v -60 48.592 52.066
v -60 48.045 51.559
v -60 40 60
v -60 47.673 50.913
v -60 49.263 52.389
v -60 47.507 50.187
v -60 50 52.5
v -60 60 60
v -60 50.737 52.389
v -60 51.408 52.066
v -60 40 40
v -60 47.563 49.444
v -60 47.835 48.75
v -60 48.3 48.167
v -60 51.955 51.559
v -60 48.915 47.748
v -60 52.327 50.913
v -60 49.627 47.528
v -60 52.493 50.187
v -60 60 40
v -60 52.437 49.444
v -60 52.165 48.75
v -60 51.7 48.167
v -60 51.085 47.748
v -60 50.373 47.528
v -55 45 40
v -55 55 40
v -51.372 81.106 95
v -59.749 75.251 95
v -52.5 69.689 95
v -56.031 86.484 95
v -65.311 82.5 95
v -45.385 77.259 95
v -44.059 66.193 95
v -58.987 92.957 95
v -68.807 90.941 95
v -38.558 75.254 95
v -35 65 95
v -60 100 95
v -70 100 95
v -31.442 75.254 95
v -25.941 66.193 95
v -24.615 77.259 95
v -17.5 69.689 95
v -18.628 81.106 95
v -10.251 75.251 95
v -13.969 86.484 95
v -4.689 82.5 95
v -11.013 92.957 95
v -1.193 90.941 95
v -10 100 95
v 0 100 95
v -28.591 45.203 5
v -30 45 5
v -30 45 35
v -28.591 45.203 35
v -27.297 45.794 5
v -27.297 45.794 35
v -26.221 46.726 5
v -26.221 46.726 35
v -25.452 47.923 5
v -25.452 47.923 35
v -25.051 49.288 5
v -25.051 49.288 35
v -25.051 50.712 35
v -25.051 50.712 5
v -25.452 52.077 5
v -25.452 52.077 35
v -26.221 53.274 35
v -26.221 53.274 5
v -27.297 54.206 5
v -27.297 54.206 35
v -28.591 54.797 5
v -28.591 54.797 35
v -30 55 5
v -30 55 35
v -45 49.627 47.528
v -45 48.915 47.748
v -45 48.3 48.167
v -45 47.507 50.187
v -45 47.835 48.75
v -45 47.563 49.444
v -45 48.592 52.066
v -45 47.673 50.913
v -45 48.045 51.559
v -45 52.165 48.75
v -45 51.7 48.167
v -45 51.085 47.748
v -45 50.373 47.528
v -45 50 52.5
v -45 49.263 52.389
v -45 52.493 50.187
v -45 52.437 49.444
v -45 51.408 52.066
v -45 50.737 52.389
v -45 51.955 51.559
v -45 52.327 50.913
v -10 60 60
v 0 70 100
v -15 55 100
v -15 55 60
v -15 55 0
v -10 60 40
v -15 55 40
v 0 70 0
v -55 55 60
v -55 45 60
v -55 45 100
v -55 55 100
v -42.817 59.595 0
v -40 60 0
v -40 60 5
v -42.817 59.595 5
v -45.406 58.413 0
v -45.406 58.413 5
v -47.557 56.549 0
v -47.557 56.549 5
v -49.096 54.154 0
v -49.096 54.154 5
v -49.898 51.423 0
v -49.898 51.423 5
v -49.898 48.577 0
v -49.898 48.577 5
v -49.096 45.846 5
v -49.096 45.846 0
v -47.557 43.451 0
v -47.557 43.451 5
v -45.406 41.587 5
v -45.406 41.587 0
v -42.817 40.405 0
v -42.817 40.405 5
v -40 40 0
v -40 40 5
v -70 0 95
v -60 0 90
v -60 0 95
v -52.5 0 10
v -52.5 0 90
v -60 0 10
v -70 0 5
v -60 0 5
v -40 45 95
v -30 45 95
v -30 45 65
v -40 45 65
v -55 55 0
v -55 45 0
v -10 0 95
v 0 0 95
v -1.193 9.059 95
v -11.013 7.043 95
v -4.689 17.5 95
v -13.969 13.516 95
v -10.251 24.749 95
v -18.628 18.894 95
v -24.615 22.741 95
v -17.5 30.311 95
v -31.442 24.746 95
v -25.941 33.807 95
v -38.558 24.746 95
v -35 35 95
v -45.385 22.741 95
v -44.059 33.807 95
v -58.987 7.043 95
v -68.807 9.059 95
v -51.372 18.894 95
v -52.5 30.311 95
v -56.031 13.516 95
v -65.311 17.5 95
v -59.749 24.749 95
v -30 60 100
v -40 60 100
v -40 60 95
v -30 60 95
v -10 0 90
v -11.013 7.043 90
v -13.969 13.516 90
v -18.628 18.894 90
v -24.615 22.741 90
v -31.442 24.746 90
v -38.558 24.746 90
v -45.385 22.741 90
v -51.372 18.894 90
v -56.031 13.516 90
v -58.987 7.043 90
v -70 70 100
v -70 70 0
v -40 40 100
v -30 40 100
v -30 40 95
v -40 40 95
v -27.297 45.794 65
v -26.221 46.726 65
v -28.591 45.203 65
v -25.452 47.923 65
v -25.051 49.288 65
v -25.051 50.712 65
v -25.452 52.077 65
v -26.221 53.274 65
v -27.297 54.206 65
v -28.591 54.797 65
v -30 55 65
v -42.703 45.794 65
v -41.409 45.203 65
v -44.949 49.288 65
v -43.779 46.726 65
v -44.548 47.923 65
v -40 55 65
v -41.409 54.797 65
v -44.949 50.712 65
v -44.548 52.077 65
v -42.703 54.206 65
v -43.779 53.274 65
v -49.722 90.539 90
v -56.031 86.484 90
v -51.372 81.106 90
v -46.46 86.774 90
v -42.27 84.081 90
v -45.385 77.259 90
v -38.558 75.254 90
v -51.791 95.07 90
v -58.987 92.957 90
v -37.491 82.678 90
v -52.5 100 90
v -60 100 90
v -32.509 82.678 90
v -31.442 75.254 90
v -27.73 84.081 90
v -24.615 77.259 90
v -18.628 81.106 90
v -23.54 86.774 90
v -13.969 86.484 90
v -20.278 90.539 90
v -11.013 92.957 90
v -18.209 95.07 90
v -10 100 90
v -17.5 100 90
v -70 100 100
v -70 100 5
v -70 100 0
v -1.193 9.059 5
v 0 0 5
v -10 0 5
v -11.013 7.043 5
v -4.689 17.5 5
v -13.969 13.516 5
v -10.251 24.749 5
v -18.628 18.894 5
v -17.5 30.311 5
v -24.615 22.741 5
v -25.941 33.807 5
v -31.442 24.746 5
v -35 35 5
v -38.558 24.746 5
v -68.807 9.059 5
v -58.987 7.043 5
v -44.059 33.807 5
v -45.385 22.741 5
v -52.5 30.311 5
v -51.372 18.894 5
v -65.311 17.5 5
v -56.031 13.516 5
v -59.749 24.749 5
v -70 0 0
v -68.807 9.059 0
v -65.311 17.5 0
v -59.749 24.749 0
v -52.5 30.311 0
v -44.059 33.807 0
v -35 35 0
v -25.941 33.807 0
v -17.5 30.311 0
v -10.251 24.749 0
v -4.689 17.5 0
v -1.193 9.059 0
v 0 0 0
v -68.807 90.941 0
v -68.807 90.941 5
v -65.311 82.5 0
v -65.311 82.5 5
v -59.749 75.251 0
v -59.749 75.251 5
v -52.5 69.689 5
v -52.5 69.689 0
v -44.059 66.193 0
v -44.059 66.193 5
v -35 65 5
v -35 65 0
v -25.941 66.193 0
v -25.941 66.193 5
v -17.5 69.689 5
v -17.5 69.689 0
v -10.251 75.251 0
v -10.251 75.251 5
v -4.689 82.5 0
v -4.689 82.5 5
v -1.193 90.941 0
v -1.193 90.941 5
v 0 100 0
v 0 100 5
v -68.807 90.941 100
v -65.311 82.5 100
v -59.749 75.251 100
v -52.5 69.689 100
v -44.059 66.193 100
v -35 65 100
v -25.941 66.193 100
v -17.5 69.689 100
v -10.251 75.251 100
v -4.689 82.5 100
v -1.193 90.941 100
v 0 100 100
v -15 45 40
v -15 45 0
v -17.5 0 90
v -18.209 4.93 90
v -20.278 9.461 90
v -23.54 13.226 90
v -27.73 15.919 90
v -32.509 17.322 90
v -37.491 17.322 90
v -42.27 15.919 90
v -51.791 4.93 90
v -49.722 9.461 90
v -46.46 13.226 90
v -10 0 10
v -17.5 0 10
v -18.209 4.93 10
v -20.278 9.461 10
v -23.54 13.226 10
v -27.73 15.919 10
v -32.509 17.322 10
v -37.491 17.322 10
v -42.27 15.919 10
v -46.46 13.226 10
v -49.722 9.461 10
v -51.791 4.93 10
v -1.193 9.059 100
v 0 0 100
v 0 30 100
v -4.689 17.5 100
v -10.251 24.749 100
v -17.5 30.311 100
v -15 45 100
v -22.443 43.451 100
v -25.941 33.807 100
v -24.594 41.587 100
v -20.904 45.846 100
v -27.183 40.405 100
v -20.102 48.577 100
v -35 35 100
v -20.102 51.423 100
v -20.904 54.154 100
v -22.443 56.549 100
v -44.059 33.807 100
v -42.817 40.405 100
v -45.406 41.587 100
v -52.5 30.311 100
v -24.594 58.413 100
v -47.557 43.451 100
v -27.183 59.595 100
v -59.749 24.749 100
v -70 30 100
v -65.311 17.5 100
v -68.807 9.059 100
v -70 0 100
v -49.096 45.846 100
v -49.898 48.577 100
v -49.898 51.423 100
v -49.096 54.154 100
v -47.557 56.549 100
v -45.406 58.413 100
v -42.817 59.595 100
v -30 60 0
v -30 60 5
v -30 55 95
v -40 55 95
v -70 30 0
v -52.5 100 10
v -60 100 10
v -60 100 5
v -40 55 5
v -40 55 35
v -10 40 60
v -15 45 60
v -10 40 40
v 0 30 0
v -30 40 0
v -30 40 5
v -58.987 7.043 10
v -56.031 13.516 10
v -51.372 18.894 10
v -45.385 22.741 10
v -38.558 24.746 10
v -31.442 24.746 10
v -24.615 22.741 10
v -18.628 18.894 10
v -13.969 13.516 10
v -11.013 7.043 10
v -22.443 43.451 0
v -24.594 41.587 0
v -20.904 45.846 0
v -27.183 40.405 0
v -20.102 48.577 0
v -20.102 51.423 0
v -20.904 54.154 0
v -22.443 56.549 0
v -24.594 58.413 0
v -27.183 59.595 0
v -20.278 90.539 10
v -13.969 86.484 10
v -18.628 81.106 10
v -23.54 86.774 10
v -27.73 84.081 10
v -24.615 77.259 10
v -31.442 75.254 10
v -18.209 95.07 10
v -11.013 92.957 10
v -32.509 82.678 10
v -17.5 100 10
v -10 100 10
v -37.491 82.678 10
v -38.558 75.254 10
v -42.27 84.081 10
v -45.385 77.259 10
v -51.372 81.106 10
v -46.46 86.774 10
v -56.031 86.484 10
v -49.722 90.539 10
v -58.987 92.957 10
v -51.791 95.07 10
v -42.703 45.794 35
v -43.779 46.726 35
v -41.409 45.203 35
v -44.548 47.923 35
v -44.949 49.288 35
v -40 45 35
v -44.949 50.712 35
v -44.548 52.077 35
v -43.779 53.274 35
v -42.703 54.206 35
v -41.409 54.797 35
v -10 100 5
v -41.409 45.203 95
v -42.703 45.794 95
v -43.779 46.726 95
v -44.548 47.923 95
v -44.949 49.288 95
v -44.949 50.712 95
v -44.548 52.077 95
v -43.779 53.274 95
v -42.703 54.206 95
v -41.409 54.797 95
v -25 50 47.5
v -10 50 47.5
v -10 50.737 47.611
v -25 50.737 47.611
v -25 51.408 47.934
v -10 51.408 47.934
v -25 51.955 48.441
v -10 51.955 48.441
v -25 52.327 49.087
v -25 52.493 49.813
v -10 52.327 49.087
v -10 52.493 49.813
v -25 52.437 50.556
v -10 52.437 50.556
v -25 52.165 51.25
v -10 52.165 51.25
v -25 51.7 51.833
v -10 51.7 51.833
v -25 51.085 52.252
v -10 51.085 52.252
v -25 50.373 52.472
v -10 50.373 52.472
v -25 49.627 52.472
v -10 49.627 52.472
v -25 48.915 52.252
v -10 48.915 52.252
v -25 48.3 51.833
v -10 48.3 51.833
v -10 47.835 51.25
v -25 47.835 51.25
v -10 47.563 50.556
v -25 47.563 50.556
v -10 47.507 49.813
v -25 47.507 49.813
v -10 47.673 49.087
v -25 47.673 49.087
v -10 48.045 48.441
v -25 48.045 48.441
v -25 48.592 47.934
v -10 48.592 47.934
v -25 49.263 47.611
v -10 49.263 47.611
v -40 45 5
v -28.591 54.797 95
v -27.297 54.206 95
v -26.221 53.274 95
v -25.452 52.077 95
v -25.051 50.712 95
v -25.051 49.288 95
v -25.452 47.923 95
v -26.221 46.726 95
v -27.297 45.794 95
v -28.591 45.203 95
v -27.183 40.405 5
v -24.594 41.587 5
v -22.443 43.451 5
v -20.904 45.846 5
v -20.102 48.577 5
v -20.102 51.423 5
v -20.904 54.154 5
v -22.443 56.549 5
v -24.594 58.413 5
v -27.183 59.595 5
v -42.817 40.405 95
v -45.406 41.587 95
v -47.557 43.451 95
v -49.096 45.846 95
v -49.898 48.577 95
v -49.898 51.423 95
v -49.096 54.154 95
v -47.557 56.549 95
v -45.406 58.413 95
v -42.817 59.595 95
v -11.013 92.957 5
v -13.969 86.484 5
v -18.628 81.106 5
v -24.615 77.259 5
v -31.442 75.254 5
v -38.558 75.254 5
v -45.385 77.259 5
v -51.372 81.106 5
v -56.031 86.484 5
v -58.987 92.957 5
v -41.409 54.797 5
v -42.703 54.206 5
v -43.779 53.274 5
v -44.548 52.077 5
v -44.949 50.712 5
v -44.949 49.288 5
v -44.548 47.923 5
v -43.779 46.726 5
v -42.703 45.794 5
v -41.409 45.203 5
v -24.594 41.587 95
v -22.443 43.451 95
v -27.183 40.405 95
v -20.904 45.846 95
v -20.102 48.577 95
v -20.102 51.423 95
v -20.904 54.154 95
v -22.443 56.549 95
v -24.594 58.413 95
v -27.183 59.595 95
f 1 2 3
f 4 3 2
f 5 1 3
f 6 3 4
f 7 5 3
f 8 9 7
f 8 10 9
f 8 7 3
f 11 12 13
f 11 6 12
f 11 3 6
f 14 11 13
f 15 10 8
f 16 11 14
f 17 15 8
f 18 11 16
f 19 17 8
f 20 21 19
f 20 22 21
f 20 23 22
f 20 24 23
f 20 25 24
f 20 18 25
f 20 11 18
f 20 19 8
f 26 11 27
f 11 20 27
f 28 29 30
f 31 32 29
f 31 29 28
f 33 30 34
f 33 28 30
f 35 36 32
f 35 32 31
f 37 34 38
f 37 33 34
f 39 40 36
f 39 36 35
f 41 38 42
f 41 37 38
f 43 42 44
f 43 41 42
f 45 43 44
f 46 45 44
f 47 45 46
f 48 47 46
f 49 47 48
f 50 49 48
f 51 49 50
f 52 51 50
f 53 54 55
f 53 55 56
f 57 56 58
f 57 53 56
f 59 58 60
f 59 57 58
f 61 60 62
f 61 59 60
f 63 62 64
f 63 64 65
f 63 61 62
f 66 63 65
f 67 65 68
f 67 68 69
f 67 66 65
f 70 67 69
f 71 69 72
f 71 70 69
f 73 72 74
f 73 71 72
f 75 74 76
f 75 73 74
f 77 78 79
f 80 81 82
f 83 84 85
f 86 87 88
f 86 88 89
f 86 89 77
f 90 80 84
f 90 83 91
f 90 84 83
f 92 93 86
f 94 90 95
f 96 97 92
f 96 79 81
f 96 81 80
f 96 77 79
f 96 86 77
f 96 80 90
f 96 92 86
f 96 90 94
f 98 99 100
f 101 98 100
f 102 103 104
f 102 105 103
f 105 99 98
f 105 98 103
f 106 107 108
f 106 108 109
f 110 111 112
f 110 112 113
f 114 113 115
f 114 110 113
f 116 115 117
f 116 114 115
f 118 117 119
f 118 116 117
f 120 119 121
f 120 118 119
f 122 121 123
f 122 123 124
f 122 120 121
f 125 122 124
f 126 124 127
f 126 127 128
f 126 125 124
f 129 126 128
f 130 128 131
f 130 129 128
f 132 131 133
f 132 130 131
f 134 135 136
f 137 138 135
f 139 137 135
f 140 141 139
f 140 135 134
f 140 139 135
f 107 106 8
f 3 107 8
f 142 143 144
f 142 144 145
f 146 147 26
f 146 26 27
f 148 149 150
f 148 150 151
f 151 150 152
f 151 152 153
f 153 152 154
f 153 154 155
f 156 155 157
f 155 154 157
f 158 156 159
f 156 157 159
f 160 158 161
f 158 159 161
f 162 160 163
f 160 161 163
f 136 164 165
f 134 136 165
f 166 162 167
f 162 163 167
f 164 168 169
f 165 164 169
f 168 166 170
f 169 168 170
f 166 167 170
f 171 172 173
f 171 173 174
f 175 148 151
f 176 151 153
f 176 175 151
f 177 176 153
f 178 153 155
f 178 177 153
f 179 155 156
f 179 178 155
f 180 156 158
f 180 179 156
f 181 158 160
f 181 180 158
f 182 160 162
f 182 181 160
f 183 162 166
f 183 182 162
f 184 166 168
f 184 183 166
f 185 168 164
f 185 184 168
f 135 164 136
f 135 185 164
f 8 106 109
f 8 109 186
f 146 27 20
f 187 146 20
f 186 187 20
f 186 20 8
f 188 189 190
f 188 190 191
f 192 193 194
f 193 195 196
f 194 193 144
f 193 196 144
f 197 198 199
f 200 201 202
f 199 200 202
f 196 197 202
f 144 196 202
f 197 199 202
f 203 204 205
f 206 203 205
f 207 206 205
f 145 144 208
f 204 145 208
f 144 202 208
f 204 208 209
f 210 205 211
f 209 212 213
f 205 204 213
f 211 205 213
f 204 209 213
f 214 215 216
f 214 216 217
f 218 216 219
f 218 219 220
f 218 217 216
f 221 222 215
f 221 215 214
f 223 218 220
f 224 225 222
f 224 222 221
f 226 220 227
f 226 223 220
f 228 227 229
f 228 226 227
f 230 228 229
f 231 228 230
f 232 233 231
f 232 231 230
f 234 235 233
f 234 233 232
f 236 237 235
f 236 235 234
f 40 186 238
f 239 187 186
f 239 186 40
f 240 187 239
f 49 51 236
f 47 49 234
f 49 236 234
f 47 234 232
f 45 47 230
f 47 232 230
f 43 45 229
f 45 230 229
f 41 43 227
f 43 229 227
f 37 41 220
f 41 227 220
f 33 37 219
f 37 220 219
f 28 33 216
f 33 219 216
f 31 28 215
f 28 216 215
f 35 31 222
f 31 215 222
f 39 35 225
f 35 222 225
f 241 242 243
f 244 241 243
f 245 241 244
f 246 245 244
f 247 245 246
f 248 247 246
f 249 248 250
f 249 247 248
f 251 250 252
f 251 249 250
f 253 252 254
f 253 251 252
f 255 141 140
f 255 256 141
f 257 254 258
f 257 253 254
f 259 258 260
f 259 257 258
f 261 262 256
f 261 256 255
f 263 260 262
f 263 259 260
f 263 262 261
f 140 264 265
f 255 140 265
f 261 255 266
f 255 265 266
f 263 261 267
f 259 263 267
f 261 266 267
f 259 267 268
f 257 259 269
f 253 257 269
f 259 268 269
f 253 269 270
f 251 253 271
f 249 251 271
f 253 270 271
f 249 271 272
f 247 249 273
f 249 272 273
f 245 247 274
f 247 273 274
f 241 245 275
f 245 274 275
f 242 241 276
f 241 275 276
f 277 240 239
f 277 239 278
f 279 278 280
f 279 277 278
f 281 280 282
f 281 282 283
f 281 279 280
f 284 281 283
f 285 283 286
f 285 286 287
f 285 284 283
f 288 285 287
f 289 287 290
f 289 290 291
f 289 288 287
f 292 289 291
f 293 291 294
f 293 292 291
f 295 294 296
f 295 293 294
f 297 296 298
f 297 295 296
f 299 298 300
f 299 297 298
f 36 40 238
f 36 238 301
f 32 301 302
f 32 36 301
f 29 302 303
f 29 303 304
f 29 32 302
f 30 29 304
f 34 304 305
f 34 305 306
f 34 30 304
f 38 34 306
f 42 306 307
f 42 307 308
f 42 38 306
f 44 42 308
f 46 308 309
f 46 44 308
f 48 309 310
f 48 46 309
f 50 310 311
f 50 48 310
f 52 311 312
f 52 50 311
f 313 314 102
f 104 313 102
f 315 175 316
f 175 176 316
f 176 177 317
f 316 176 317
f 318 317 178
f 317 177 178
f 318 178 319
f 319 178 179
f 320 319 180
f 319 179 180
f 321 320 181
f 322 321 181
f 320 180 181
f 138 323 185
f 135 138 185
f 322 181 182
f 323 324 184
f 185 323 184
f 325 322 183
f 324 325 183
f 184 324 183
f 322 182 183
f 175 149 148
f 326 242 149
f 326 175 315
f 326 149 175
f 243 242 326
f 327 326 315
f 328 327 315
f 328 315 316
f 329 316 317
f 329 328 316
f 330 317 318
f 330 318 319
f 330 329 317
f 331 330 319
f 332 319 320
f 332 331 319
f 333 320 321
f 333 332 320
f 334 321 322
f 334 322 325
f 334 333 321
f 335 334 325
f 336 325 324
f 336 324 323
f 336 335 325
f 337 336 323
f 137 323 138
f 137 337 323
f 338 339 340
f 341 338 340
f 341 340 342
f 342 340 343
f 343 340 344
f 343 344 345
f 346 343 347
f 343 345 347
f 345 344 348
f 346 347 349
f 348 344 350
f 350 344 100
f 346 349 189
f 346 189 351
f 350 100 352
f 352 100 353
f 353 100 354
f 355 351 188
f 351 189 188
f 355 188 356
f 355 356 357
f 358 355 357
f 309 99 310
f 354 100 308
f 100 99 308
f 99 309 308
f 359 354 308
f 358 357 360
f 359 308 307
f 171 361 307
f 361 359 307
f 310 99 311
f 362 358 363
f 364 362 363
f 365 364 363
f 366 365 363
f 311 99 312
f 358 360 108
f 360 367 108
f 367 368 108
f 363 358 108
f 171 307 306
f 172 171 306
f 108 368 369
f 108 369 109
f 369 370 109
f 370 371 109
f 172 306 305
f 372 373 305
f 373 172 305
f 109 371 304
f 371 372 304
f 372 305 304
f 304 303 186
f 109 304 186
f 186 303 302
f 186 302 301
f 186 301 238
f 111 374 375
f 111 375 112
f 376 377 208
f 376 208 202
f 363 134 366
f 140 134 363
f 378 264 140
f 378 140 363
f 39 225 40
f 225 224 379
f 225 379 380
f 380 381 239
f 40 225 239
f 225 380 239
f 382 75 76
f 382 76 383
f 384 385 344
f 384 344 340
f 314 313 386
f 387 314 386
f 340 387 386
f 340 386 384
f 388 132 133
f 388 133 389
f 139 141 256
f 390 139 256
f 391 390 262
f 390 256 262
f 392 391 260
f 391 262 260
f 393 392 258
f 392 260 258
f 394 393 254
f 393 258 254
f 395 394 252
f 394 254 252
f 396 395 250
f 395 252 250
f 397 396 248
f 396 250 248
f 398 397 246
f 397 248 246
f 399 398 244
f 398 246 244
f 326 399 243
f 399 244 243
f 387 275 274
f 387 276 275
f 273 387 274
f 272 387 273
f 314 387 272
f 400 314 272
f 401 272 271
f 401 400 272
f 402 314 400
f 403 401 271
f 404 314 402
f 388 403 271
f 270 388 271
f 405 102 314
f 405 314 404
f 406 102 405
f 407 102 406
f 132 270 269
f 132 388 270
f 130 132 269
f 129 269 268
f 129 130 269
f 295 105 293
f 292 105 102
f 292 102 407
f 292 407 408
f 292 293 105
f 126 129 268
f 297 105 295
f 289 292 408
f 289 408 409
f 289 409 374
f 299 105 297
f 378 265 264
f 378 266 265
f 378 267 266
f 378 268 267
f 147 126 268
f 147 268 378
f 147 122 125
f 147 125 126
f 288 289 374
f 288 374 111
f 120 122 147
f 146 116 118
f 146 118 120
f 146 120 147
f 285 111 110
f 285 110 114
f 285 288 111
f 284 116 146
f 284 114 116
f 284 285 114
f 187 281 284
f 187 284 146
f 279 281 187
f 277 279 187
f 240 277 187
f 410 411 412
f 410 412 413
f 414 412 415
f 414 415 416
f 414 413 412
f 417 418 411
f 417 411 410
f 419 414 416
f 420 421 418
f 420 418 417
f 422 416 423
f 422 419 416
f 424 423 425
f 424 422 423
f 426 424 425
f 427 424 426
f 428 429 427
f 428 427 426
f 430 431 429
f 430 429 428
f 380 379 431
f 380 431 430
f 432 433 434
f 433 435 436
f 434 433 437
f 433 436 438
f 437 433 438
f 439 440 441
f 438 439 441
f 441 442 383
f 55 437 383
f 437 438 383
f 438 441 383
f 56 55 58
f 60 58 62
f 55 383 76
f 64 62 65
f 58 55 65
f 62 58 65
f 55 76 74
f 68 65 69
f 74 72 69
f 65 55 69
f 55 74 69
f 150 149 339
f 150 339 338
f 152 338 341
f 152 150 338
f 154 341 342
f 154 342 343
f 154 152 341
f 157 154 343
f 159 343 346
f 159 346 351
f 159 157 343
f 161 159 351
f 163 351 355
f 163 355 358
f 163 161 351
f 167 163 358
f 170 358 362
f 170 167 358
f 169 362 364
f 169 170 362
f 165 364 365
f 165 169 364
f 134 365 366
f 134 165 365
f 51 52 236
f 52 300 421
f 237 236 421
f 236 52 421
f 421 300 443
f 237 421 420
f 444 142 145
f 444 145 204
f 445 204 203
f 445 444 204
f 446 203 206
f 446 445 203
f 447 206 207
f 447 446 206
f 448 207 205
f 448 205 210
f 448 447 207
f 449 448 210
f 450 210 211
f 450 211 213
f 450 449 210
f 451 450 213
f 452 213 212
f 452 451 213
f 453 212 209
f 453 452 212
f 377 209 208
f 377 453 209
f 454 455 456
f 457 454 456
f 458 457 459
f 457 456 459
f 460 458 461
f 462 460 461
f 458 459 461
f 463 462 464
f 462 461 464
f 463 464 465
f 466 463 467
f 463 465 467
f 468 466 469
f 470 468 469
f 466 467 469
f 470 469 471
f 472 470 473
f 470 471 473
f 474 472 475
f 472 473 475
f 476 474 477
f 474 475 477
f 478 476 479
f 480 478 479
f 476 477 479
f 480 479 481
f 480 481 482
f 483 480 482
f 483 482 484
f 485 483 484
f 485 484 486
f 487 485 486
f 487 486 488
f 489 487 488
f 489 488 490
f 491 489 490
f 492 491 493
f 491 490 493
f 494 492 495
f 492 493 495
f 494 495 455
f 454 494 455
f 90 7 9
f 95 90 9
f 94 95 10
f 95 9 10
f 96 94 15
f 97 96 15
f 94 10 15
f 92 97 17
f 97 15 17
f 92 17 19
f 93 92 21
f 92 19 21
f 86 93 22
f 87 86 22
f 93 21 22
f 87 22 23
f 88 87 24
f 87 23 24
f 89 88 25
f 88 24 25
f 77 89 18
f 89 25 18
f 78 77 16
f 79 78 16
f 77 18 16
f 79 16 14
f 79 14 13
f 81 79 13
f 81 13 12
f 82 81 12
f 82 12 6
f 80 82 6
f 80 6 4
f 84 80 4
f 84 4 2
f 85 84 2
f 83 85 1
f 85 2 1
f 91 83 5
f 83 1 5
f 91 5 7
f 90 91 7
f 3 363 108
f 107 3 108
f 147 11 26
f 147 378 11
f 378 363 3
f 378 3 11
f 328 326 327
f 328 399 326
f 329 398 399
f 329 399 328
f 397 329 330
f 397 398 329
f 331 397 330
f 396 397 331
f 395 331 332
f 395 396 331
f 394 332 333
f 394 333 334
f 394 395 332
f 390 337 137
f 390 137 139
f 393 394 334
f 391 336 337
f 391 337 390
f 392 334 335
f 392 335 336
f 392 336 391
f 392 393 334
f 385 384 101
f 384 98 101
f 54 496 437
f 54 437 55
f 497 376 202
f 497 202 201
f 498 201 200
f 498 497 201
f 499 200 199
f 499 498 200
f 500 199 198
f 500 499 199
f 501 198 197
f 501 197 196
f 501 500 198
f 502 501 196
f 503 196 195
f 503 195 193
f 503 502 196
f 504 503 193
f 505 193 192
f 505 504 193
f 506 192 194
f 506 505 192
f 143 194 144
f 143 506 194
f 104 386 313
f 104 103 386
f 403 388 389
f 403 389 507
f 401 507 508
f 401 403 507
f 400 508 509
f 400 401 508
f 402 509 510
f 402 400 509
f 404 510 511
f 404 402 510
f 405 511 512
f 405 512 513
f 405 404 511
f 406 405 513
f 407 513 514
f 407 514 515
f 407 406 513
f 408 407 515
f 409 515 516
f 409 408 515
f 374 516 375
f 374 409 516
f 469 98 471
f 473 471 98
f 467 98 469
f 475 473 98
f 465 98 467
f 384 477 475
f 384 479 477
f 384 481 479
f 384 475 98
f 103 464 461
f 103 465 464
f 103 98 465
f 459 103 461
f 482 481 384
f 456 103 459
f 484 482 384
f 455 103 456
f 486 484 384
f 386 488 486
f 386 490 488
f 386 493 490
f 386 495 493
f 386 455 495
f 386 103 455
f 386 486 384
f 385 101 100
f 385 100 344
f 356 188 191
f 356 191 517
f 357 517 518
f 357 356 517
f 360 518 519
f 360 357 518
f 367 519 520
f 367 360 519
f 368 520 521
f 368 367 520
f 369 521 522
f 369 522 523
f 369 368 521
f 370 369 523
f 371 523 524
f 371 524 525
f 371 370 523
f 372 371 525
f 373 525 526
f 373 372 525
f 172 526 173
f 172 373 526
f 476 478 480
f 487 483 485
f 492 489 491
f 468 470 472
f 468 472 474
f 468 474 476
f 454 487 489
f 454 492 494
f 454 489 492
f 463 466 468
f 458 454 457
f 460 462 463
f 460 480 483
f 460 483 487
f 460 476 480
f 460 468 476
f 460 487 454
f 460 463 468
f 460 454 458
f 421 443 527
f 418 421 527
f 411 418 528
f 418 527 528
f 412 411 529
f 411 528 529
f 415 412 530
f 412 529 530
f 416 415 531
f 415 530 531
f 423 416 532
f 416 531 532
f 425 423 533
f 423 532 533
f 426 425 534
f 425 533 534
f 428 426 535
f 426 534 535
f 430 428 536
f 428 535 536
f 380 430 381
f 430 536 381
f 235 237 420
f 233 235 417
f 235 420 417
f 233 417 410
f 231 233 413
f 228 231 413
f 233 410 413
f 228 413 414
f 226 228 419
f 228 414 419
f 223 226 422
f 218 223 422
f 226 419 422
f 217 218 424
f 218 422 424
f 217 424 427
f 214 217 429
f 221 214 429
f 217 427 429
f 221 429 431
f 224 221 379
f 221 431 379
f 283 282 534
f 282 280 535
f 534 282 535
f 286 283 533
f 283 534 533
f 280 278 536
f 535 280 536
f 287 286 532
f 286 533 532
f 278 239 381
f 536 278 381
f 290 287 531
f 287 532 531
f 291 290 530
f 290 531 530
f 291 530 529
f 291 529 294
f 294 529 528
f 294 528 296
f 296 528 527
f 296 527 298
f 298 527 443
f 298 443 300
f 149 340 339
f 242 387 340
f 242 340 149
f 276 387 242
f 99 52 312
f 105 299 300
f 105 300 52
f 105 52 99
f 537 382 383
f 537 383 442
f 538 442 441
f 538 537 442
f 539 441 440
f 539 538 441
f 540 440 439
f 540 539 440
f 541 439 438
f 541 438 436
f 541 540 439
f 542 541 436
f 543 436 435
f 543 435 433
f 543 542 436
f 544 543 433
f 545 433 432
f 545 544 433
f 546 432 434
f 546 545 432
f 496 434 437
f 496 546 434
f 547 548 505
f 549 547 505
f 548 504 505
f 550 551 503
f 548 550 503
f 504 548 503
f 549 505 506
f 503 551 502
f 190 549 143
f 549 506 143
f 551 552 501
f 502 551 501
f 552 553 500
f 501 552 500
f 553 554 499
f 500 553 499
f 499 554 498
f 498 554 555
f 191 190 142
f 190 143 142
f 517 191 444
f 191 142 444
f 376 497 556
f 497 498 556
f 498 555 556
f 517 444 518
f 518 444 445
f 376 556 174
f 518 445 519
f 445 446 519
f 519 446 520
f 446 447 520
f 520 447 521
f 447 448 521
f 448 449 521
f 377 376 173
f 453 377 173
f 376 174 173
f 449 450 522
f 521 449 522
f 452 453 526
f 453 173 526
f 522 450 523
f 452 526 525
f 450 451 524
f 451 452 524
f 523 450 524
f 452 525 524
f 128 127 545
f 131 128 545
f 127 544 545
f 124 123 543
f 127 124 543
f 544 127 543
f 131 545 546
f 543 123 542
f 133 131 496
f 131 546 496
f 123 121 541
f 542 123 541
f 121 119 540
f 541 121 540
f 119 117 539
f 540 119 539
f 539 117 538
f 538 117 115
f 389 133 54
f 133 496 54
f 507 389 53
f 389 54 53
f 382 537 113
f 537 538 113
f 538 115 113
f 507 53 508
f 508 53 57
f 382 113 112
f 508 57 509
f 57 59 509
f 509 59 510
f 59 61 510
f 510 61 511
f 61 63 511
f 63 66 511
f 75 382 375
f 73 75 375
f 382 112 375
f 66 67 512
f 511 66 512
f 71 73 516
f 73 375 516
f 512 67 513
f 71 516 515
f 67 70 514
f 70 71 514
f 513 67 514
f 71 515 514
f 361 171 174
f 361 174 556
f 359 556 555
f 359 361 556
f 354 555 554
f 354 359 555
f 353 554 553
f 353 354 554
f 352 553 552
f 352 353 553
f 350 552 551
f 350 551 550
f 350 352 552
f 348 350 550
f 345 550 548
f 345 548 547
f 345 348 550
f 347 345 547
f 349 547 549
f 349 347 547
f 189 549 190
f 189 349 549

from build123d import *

# Parameters (mm, degrees)
BOSS_EXTRUDE1_DEPTH = 100
BOSS_EXTRUDE2_DEPTH = 95
CUT_EXTRUDE1_DEPTH  = 5
BOSS_EXTRUDE5_DEPTH = 85
CUT_EXTRUDE4_DEPTH  = 5
BOSS_EXTRUDE6_DEPTH = 60
CUT_EXTRUDE5_DEPTH  = 40
SKETCH11_R          = 2.5
CUT_EXTRUDE6_DEPTH  = 15
SKETCH12_R          = 2.5
CUT_EXTRUDE7_DEPTH  = 15
CUT_EXTRUDE8_DEPTH  = 5
CUT_EXTRUDE9_DEPTH  = 30
CUT_EXTRUDE10_DEPTH = 5
CUT_EXTRUDE11_DEPTH = 30


with BuildPart() as part:
    # Sketch1 → Boss-Extrude1 (new body)
    with BuildSketch(Plane.XY):
        with BuildLine():
            Line((-70, 0), (-70, 30))
            Line((-70, 30), (-55, 45))
            Line((-55, 45), (-55, 55))
            Line((-55, 55), (-70, 70))
            Line((-70, 70), (-70, 100))
            ThreePointArc((-70, 100), (-35, 65), (0, 100))
            Line((0, 100), (0, 70))
            Line((0, 70), (-15, 55))
            Line((-15, 55), (-15, 45))
            Line((-15, 45), (0, 30))
            Line((0, 30), (0, 0))
            ThreePointArc((0, 0), (-35, 35), (-70, 0))
        make_face()
    extrude(amount=BOSS_EXTRUDE1_DEPTH)

    # Sketch2 → Boss-Extrude2 (add)
    with BuildSketch(Plane(origin=(0, 0, 0), x_dir=(-1, 0, 0), z_dir=(0, 0, -1))):
        with BuildLine():
            Line((0, 100), (10, 100))
            ThreePointArc((10, 100), (35, 75), (60, 100))
            Line((60, 100), (70, 100))
            ThreePointArc((70, 100), (35, 65), (0, 100))
        make_face()
        with BuildLine():
            Line((0, 0), (10, 0))
            ThreePointArc((10, 0), (35, 25), (60, 0))
            Line((60, 0), (70, 0))
            ThreePointArc((70, 0), (35, 35), (0, 0))
        make_face()
    extrude(amount=-BOSS_EXTRUDE2_DEPTH)

    # Sketch3 → Cut-Extrude1 (cut)
    with BuildSketch(Plane(origin=(0, 0, 0), x_dir=(-1, 0, 0), z_dir=(0, 0, -1))):
        with BuildLine():
            Line((0, 100), (10, 100))
            ThreePointArc((10, 100), (35, 75), (60, 100))
            Line((60, 100), (70, 100))
            ThreePointArc((70, 100), (35, 65), (0, 100))
        make_face()
        with BuildLine():
            Line((60, 0), (70, 0))
            ThreePointArc((70, 0), (35, 35), (0, 0))
            Line((0, 0), (10, 0))
            ThreePointArc((10, 0), (35, 25), (60, 0))
        make_face()
    extrude(amount=-CUT_EXTRUDE1_DEPTH, mode=Mode.SUBTRACT)

    # Sketch4 → Boss-Extrude5 (add)
    with BuildSketch(Plane(origin=(0, 0, 5), x_dir=(-1, 0, 0), z_dir=(0, 0, -1))):
        with BuildLine():
            Line((10, 100), (17.5, 100))
            ThreePointArc((17.5, 100), (35, 82.5), (52.5, 100))
            Line((52.5, 100), (60, 100))
            ThreePointArc((60, 100), (35, 75), (10, 100))
        make_face()
        with BuildLine():
            Line((10, 0), (17.5, 0))
            ThreePointArc((17.5, 0), (35, 17.5), (52.5, 0))
            Line((52.5, 0), (60, 0))
            ThreePointArc((60, 0), (35, 25), (10, 0))
        make_face()
    extrude(amount=-BOSS_EXTRUDE5_DEPTH)

    # Sketch7 → Cut-Extrude4 (cut)
    with BuildSketch(Plane(origin=(0, 0, 5), x_dir=(-1, 0, 0), z_dir=(0, 0, -1))):
        with BuildLine():
            ThreePointArc((52.5, 100), (35, 82.5), (17.5, 100))
            Line((17.5, 100), (10, 100))
            ThreePointArc((10, 100), (35, 75), (60, 100))
            Line((60, 100), (52.5, 100))
        make_face()
        with BuildLine():
            Line((10, 0), (17.5, 0))
            ThreePointArc((17.5, 0), (35, 17.5), (52.5, 0))
            Line((52.5, 0), (60, 0))
            ThreePointArc((60, 0), (35, 25), (10, 0))
        make_face()
    extrude(amount=-CUT_EXTRUDE4_DEPTH, mode=Mode.SUBTRACT)

    # Sketch9 → Boss-Extrude6 (add)
    with BuildSketch(Plane(origin=(0, 0, 0), x_dir=(-1, 0, 0), z_dir=(0, 0, -1))):
        Polygon((10, 40), (15, 45), (15, 55), (10, 60), align=None)
        Polygon((60, 60), (55, 55), (55, 45), (60, 40), align=None)
    extrude(amount=-BOSS_EXTRUDE6_DEPTH)

    # Sketch10 → Cut-Extrude5 (cut)
    with BuildSketch(Plane(origin=(0, 0, 0), x_dir=(-1, 0, 0), z_dir=(0, 0, -1))):
        Polygon((10, 40), (15, 45), (15, 55), (10, 60), align=None)
        Polygon((60, 40), (55, 45), (55, 55), (60, 60), align=None)
    extrude(amount=-CUT_EXTRUDE5_DEPTH, mode=Mode.SUBTRACT)

    # Sketch11 → Cut-Extrude6 (cut)
    with BuildSketch(Plane(origin=(-10, 0, 0), x_dir=(0, 0, -1), z_dir=(1, 0, 0))):
        with Locations((-50, 50)):
            Circle(SKETCH11_R)
    extrude(amount=-CUT_EXTRUDE6_DEPTH, mode=Mode.SUBTRACT)

    # Sketch12 → Cut-Extrude7 (cut)
    with BuildSketch(Plane.ZY.offset(60)):
        with Locations((50, 50)):
            Circle(SKETCH12_R)
    extrude(amount=-CUT_EXTRUDE7_DEPTH, mode=Mode.SUBTRACT)

    # Sketch13 → Cut-Extrude8 (cut)
    with BuildSketch(Plane(origin=(0, 0, 0), x_dir=(-1, 0, 0), z_dir=(0, 0, -1))):
        with BuildLine():
            Line((30, 60), (40, 60))
            ThreePointArc((40, 60), (50, 50), (40, 40))
            Line((40, 40), (30, 40))
            ThreePointArc((30, 40), (20, 50), (30, 60))
        make_face()
    extrude(amount=-CUT_EXTRUDE8_DEPTH, mode=Mode.SUBTRACT)

    # Sketch14 → Cut-Extrude9 (cut)
    with BuildSketch(Plane(origin=(0, 0, 5), x_dir=(-1, 0, 0), z_dir=(0, 0, -1))):
        with BuildLine():
            Line((30, 55), (40, 55))
            ThreePointArc((40, 55), (45, 50), (40, 45))
            Line((40, 45), (30, 45))
            ThreePointArc((30, 45), (25, 50), (30, 55))
        make_face()
    extrude(amount=-CUT_EXTRUDE9_DEPTH, mode=Mode.SUBTRACT)

    # Sketch15 → Cut-Extrude10 (cut)
    with BuildSketch(Plane.XY.offset(100)):
        with BuildLine():
            Line((-40, 60), (-30, 60))
            ThreePointArc((-30, 60), (-20, 50), (-30, 40))
            Line((-30, 40), (-40, 40))
            ThreePointArc((-40, 40), (-50, 50), (-40, 60))
        make_face()
    extrude(amount=-CUT_EXTRUDE10_DEPTH, mode=Mode.SUBTRACT)

    # Sketch16 → Cut-Extrude11 (cut)
    with BuildSketch(Plane.XY.offset(95)):
        with BuildLine():
            Line((-40, 55), (-30, 55))
            ThreePointArc((-30, 55), (-25, 50), (-30, 45))
            Line((-30, 45), (-40, 45))
            ThreePointArc((-40, 45), (-45, 50), (-40, 55))
        make_face()
    extrude(amount=-CUT_EXTRUDE11_DEPTH, mode=Mode.SUBTRACT)


solid = part.part
